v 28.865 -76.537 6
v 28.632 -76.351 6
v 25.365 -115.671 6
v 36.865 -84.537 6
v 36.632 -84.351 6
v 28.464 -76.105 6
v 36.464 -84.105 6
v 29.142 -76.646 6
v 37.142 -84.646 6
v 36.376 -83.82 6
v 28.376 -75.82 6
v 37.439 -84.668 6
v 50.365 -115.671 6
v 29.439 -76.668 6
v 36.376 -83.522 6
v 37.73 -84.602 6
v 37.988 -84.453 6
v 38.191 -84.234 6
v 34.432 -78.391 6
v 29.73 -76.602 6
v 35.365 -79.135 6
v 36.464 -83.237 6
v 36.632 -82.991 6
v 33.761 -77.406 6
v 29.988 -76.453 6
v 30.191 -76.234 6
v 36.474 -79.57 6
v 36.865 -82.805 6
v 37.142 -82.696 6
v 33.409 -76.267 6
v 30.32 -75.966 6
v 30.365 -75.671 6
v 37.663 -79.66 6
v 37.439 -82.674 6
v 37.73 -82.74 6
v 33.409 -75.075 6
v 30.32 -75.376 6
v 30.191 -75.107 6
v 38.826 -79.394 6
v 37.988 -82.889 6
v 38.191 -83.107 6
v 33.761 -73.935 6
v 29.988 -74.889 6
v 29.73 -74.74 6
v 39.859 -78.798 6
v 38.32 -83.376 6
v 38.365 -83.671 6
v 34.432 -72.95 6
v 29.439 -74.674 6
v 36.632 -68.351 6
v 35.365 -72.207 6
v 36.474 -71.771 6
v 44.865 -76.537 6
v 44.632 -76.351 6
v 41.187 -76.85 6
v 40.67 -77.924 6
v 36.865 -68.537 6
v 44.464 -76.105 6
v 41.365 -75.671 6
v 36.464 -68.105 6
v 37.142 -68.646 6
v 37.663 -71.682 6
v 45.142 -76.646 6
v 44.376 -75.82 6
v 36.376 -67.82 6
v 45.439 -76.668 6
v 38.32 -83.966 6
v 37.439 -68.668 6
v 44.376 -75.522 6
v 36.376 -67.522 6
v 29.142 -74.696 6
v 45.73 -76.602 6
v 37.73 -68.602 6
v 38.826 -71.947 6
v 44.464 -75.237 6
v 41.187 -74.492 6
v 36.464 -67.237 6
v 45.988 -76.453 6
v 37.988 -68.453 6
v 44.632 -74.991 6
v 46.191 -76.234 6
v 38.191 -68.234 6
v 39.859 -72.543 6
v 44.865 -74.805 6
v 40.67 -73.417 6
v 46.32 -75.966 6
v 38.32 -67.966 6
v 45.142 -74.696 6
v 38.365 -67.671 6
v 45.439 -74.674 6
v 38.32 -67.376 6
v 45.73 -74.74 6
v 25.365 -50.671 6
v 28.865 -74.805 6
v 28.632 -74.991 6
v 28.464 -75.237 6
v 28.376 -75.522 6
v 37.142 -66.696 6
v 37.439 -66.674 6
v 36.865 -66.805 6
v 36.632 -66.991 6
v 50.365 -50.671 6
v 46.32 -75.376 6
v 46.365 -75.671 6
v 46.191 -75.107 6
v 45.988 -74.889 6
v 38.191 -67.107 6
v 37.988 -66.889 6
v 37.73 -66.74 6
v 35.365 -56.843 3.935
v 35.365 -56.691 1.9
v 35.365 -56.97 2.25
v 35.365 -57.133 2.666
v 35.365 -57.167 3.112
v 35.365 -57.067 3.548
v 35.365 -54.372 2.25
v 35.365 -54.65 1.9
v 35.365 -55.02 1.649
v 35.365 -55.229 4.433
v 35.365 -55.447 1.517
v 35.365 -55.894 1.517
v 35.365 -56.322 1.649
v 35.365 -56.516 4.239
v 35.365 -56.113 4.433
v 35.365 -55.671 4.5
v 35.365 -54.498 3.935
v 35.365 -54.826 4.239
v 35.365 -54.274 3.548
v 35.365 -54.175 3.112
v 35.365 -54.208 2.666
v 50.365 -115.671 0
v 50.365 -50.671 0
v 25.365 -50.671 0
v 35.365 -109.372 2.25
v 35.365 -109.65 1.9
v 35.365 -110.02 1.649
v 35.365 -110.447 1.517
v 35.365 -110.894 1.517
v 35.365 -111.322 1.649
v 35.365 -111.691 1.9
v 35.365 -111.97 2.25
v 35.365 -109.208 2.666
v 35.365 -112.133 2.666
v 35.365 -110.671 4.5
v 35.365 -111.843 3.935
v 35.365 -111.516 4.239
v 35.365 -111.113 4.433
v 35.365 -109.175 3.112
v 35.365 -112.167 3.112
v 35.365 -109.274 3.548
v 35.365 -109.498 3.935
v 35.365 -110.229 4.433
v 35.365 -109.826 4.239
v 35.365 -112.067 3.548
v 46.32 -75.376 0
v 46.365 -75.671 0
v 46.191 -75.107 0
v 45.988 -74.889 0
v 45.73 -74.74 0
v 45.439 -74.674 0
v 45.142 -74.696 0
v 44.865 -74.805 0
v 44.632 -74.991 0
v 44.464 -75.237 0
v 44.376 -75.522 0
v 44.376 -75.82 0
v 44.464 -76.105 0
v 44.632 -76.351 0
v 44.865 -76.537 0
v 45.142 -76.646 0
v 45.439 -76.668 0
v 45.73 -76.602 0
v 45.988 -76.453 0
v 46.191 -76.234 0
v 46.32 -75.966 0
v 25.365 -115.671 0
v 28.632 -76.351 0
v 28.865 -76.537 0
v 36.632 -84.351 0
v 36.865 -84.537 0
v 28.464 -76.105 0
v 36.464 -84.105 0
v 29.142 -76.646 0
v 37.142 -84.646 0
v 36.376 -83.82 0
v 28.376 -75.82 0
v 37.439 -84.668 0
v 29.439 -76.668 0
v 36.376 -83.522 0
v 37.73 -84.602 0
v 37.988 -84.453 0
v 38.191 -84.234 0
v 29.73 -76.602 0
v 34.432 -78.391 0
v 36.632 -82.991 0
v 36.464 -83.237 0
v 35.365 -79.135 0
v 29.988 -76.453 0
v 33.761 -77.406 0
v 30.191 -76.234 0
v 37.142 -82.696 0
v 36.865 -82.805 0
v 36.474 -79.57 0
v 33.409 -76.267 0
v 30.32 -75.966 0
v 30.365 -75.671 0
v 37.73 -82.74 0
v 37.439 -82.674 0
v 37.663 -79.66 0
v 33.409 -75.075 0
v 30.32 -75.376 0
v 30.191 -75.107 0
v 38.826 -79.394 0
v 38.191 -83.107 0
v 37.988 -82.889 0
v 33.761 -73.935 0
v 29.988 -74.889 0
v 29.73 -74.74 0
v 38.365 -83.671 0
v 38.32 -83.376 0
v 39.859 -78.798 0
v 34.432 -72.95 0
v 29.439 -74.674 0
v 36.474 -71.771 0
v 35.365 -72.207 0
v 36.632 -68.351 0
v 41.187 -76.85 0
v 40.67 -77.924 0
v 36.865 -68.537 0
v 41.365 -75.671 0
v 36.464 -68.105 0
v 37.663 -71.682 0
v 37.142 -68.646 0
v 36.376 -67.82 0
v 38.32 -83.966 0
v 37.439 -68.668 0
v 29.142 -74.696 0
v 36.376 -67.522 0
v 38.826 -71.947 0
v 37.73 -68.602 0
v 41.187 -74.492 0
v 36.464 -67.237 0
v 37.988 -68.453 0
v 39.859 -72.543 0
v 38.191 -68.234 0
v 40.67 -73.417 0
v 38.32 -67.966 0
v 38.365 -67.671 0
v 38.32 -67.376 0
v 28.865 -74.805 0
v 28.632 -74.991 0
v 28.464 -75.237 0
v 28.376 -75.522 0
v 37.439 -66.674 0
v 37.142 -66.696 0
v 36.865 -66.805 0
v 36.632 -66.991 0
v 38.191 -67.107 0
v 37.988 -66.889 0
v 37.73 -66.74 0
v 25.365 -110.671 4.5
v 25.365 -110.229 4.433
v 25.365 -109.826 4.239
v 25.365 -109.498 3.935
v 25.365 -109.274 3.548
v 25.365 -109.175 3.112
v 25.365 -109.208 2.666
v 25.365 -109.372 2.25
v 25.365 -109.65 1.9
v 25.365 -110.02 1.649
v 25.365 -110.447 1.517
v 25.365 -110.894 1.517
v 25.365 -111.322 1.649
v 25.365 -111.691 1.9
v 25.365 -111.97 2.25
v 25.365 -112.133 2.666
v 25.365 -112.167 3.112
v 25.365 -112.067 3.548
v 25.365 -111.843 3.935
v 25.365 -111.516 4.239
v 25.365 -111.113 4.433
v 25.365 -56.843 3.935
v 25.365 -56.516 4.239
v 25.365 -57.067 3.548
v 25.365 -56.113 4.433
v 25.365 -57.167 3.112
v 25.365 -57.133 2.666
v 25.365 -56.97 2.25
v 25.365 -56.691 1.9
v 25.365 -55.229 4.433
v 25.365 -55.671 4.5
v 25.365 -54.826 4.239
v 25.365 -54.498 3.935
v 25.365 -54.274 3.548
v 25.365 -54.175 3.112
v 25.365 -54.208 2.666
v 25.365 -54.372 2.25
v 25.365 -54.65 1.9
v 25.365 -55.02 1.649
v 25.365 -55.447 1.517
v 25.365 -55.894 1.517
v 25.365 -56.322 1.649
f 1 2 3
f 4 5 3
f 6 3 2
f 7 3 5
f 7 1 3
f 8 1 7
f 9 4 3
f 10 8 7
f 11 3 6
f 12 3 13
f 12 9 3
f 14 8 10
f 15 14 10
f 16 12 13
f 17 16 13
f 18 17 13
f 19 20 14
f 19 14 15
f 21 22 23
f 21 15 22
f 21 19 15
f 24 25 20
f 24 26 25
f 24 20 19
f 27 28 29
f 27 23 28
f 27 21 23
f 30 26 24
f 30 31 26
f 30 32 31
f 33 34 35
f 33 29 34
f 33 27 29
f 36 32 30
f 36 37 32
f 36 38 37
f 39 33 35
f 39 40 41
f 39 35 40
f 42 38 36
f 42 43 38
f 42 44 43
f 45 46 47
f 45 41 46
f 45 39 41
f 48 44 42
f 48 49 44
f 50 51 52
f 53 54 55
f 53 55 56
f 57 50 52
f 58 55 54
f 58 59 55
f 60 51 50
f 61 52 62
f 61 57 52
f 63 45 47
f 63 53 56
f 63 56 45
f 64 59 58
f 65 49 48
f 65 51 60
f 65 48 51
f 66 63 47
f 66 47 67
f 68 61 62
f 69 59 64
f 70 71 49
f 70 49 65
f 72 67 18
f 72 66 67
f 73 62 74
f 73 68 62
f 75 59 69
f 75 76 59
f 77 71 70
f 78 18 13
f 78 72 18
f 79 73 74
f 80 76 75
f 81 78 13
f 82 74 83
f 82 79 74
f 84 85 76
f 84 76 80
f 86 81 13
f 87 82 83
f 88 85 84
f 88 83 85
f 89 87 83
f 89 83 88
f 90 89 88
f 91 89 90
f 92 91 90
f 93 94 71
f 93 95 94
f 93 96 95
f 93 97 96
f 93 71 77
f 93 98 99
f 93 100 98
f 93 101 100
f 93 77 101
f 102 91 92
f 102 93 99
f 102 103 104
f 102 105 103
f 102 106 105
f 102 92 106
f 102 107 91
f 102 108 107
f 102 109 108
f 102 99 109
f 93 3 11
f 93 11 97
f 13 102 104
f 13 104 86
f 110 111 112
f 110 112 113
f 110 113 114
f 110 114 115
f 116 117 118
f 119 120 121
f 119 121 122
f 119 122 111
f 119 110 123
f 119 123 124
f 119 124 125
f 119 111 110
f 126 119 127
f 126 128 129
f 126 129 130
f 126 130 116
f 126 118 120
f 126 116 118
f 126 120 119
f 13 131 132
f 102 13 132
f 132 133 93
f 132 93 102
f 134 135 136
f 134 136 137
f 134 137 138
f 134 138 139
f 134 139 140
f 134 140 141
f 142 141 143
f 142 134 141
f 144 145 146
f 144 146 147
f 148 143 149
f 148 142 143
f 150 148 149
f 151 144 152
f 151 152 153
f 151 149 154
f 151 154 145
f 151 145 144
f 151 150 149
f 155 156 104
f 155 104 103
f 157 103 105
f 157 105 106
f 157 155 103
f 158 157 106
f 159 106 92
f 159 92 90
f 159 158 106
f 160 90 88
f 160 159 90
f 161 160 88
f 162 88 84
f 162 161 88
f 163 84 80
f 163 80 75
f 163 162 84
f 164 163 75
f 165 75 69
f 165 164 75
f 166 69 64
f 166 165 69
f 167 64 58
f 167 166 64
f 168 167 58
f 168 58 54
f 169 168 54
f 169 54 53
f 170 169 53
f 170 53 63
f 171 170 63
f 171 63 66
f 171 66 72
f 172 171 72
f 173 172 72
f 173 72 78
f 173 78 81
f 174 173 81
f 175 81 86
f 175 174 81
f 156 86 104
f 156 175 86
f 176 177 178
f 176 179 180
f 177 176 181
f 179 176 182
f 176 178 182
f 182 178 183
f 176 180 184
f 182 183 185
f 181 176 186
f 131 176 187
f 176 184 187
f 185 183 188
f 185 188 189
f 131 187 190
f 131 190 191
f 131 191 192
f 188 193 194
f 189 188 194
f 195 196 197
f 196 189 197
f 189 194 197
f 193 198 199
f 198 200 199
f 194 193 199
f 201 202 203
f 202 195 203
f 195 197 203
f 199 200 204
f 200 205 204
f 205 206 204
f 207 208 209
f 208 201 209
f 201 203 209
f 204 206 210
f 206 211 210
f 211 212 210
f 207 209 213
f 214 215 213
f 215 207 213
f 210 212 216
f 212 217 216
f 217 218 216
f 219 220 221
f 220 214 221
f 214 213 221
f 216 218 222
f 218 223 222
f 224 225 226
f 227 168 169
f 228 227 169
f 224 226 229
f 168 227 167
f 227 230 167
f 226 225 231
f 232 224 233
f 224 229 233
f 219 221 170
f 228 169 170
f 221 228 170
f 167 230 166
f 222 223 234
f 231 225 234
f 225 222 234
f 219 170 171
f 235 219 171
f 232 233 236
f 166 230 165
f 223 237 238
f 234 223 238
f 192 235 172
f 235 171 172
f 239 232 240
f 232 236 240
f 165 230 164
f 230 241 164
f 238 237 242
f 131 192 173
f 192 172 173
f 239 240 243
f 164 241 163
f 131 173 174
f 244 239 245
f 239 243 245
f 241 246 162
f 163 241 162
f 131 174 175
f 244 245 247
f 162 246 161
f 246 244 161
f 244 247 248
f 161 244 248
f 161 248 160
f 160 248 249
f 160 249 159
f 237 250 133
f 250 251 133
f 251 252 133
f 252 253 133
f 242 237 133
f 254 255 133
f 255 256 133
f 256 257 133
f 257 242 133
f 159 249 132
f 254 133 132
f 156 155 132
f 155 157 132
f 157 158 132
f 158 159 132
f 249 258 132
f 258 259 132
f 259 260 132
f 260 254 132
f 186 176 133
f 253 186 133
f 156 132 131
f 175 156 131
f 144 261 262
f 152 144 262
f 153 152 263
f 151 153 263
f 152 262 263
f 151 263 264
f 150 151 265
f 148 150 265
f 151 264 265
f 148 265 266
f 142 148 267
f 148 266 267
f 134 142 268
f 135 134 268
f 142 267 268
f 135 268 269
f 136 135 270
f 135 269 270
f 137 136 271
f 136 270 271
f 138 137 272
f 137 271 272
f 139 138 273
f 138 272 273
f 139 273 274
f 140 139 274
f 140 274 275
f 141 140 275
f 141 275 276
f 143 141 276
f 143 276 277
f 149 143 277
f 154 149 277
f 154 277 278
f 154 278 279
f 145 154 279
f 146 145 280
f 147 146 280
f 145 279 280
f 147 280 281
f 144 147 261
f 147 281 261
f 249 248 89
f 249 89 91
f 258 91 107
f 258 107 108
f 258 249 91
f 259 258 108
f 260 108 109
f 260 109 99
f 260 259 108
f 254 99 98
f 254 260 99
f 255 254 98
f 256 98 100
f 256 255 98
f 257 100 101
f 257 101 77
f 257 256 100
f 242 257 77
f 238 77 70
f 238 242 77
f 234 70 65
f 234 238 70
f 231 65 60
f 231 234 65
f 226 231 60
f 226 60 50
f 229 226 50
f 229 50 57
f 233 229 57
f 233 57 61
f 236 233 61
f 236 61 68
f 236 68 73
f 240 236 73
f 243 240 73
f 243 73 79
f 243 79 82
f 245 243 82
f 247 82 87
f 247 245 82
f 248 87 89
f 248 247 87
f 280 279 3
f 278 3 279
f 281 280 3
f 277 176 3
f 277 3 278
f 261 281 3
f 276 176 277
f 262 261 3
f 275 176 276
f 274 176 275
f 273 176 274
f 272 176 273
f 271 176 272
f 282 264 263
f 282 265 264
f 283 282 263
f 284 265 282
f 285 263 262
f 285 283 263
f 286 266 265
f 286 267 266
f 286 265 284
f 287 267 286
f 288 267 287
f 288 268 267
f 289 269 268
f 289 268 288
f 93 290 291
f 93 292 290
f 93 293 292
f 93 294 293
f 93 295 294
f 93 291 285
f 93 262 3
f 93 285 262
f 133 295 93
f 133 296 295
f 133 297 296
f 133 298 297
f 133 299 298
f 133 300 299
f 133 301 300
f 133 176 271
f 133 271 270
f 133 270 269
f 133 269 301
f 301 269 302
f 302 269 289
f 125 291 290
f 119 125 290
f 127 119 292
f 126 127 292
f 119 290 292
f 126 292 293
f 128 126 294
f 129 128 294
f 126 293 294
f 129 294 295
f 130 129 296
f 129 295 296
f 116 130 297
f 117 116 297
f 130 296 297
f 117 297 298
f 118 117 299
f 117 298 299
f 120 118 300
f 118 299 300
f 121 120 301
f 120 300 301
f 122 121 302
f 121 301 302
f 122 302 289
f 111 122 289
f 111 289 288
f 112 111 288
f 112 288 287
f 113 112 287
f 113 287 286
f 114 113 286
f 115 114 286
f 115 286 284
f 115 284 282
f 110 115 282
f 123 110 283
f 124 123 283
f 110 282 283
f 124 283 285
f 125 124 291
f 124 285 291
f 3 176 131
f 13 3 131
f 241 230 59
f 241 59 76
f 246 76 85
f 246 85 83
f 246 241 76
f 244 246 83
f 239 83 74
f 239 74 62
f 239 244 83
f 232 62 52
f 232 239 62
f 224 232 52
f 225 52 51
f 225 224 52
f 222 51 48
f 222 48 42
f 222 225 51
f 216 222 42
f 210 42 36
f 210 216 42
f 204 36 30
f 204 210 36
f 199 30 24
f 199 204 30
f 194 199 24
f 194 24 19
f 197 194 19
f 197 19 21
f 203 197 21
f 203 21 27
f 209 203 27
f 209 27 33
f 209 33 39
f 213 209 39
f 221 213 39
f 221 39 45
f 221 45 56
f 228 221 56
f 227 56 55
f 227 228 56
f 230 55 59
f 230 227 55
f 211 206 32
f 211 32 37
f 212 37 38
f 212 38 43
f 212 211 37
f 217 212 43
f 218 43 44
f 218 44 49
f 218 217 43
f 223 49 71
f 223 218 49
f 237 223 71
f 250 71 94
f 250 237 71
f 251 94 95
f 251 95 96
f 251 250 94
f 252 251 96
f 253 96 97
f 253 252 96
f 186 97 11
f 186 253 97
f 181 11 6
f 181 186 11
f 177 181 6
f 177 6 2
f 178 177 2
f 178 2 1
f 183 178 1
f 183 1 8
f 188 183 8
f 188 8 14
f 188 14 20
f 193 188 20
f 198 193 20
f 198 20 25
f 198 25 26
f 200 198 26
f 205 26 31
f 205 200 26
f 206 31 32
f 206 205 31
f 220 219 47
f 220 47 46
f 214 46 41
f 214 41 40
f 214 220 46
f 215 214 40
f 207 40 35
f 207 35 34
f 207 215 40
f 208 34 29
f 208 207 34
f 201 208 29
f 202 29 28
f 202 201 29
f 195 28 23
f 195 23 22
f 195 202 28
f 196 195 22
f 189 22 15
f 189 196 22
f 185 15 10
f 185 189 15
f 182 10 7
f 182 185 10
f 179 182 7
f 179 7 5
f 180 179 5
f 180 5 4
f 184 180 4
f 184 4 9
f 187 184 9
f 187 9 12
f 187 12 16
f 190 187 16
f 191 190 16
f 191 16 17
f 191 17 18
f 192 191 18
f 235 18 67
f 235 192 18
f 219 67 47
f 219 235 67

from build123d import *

# Parameters (mm, degrees)
ESQUISSE1_W             = 25
ESQUISSE1_H             = 65
ESQUISSE1_R             = 1
ESQUISSE1_R_2           = 4
BOSS_EXTRU_1_DEPTH      = 6
ESQUISSE4_R             = 1.5
ENL_V_MAT_EXTRU_3_DEPTH = 10


with BuildPart() as part:
    # Esquisse1 → Boss.-Extru.1 (new body)
    with BuildSketch(Plane.XY):
        with Locations((37.864568032, -83.170745263)):
            Rectangle(ESQUISSE1_W, ESQUISSE1_H)
        with Locations((29.364568032, -75.670745263)):
            Circle(ESQUISSE1_R, mode=Mode.SUBTRACT)
        with Locations((37.364568032, -67.670745263)):
            Circle(ESQUISSE1_R, mode=Mode.SUBTRACT)
        with Locations((45.364568032, -75.670745263)):
            Circle(ESQUISSE1_R, mode=Mode.SUBTRACT)
        with Locations((37.364568032, -83.670745263)):
            Circle(ESQUISSE1_R, mode=Mode.SUBTRACT)
        with Locations((37.364568032, -75.670745263)):
            Circle(ESQUISSE1_R_2, mode=Mode.SUBTRACT)
    extrude(amount=BOSS_EXTRU_1_DEPTH)

    # Esquisse4 → Enlèv. mat.-Extru.3 (cut)
    with BuildSketch(Plane.ZY.offset(-25.364568032)):
        with Locations((3, -55.670745263)):
            Circle(ESQUISSE4_R)
        with Locations((3, -110.670745263)):
            Circle(ESQUISSE4_R)
    extrude(amount=-ENL_V_MAT_EXTRU_3_DEPTH, mode=Mode.SUBTRACT)


solid = part.part
